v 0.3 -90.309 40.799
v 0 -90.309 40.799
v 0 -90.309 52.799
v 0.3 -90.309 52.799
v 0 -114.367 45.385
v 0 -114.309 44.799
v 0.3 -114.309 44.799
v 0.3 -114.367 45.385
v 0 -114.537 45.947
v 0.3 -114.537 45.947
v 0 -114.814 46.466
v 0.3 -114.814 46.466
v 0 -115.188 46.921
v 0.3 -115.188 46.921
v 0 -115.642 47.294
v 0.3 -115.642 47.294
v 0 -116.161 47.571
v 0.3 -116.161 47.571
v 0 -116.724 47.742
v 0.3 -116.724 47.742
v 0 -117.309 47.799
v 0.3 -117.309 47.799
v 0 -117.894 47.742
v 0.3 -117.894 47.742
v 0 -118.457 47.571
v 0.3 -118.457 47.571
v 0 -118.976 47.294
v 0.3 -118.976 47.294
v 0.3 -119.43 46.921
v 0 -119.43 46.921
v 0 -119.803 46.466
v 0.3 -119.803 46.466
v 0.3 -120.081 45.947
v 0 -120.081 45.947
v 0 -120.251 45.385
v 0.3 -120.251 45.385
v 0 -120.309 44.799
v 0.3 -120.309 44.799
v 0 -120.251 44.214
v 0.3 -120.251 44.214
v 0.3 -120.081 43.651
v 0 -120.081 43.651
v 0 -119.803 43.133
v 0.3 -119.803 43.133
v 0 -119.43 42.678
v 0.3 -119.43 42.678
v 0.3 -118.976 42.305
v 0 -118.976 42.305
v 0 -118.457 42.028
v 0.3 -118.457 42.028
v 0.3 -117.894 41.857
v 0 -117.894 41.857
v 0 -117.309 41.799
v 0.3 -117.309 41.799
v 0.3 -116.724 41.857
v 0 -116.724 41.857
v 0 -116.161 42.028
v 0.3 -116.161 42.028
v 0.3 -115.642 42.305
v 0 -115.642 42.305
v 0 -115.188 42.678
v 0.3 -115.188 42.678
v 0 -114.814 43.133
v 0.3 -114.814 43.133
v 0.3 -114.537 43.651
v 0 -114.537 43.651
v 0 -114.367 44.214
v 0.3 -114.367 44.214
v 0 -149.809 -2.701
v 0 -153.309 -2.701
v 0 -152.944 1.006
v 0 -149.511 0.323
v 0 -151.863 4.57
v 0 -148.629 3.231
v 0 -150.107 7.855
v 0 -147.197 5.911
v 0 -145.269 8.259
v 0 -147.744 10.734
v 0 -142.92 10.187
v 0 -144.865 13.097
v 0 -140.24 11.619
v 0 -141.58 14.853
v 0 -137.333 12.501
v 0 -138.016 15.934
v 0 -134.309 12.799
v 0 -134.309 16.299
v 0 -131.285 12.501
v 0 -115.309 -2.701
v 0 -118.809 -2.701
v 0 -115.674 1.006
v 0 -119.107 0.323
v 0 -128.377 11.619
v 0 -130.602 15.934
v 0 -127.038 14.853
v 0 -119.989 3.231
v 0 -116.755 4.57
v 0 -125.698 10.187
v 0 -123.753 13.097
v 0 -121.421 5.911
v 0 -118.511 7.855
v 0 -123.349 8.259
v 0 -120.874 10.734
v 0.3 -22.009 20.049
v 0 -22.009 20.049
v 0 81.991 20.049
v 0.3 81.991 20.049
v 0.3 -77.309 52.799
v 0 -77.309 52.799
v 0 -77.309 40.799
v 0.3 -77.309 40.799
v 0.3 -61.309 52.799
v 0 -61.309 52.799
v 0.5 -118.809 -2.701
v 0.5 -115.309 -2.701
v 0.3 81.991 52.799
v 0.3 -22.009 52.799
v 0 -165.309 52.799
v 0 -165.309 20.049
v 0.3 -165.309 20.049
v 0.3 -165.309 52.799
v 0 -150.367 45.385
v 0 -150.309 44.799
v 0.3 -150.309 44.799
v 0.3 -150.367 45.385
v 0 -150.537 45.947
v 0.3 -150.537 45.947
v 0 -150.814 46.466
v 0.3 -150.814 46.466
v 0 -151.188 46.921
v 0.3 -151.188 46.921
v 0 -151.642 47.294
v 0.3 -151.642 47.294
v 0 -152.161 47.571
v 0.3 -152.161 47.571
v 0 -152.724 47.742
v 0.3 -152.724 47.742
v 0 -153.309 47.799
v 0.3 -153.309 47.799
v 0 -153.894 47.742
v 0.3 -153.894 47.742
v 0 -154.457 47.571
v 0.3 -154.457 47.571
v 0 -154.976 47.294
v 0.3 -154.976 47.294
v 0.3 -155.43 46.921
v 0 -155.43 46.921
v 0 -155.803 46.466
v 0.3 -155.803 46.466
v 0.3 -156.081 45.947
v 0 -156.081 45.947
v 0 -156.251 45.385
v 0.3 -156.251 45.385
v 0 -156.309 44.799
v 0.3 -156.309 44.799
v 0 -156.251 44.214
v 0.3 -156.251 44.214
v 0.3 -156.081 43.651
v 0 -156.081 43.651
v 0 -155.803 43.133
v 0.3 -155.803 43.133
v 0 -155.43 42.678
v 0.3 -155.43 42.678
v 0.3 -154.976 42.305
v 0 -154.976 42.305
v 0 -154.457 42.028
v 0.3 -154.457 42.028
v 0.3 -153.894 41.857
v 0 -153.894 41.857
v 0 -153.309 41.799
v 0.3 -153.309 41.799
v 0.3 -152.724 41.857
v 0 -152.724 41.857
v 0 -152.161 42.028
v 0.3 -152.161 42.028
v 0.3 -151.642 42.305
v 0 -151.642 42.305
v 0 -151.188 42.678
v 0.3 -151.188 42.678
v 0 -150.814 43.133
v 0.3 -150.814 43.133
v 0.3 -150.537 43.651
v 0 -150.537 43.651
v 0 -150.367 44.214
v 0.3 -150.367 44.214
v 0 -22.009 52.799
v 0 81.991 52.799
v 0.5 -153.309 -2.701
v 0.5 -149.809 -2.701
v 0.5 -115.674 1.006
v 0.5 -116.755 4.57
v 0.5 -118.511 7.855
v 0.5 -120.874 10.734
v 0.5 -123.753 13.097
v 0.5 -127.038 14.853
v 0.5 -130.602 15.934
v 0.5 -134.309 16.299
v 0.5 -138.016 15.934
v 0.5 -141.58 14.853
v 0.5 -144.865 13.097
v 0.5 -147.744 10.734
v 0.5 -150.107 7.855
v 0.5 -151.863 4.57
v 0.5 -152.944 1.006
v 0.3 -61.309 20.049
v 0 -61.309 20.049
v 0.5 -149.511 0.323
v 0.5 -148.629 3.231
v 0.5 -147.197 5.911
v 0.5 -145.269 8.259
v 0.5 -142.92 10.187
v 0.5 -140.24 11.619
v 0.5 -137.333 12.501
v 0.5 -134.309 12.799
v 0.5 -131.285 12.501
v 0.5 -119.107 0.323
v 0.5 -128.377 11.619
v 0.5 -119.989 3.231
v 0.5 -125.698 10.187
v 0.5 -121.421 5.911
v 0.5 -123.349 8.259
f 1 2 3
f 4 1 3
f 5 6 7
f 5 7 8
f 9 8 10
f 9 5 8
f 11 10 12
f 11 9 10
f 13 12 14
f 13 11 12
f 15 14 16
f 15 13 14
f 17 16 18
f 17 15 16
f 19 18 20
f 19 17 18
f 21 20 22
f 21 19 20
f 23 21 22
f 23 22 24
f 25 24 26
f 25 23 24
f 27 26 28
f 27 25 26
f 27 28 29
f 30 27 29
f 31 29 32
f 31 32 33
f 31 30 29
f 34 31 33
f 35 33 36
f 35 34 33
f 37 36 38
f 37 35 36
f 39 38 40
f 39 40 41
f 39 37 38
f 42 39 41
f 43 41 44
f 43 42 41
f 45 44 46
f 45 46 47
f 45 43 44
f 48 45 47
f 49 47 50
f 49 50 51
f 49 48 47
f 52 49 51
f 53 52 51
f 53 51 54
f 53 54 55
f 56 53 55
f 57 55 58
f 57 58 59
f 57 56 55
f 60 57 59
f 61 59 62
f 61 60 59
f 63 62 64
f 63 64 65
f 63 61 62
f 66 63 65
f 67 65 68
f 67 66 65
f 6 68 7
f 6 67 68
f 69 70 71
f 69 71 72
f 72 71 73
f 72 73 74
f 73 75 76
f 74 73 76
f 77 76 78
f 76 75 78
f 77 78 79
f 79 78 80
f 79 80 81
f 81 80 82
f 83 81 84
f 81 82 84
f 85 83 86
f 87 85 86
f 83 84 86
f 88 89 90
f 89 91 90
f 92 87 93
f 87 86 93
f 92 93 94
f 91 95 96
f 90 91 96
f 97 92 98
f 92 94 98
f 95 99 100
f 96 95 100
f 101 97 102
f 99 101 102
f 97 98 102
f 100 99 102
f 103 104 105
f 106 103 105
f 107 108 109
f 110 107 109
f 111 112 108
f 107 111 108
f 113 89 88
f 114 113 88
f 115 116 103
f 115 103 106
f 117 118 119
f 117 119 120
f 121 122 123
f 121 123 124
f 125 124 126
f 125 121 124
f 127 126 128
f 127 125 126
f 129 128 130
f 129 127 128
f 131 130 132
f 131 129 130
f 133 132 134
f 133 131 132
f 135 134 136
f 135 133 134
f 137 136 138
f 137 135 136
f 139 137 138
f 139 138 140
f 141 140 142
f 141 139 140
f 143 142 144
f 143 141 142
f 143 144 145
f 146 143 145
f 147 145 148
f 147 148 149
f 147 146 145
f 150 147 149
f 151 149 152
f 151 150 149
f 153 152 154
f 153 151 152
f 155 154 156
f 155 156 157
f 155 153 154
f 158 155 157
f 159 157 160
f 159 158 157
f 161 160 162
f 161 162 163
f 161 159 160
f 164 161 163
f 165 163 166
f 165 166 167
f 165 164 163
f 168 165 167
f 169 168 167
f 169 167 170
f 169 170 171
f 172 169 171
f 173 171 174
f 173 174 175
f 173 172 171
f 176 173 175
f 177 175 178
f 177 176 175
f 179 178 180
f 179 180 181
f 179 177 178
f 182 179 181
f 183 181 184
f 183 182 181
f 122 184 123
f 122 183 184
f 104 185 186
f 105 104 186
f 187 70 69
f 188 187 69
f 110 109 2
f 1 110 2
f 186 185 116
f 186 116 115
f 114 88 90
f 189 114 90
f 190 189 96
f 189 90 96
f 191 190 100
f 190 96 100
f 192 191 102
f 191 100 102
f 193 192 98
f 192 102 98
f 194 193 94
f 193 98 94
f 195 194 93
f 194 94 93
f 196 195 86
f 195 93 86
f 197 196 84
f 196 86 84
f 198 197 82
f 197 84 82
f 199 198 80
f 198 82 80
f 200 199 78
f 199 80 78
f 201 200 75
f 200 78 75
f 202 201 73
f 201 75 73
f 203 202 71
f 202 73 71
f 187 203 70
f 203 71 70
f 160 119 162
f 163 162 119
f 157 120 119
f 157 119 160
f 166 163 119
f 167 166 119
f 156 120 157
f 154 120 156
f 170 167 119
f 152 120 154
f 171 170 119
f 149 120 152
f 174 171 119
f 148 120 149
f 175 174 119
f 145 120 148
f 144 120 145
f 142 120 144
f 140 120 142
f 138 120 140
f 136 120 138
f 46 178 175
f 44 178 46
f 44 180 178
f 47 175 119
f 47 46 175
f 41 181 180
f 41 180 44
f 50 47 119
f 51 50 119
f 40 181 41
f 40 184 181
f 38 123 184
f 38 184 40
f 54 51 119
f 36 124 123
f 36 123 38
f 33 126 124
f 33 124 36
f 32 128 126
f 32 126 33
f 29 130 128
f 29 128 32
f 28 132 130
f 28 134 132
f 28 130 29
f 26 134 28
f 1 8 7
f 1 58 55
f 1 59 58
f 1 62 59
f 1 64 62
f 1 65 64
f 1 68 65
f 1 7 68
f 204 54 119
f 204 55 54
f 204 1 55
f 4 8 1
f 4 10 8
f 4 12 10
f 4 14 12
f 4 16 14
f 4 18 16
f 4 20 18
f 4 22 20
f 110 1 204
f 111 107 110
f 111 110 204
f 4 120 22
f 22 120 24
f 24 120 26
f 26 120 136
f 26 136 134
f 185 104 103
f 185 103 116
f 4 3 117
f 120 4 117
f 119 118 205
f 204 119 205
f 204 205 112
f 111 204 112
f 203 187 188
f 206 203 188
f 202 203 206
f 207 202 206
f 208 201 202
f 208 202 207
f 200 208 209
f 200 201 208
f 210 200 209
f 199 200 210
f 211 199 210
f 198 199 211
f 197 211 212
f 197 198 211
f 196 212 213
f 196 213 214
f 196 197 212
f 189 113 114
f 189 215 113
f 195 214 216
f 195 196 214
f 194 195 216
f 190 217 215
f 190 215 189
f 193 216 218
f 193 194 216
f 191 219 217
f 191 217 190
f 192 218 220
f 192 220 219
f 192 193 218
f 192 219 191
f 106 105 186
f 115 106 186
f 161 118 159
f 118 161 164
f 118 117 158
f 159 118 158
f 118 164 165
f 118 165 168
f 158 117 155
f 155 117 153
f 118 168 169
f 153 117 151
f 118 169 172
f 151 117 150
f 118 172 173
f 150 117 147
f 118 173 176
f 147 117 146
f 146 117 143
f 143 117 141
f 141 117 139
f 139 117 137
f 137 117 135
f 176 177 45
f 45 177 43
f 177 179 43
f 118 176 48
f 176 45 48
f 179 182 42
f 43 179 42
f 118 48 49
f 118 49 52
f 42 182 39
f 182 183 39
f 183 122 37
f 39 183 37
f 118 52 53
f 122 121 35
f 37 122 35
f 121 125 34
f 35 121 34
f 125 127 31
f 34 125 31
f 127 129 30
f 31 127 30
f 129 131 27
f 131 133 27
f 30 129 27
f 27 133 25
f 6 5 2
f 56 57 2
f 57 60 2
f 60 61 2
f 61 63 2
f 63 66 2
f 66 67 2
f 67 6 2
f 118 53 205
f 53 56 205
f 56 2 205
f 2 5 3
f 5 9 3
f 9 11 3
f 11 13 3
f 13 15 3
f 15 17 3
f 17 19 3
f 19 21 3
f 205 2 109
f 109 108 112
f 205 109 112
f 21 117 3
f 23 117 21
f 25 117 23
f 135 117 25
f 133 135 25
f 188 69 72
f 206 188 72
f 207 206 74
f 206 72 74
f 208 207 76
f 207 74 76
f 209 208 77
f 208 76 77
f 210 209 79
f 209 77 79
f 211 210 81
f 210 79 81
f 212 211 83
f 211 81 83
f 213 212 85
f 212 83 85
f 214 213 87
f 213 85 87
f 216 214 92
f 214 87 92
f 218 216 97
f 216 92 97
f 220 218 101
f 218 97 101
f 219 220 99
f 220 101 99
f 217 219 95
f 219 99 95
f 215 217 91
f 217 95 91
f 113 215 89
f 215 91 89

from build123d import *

# Parameters (mm, degrees)
F0_W     = 62
F0_H     = 32.75
F0_R     = 3
F1_DEPTH = 0.3
F0_W_2   = 104
F2_DEPTH = 0.5


# Not quite as in the source:
# - a feature names something its author has since deleted; it is built from what else it names


with BuildPart() as f1:
    # F0 (on Right) → F1 (new body)
    with BuildSketch(Plane.YZ):
        Polygon((-103.3088661638, 20.0492352203), (-61.3088661638, 20.0492352203), (-61.3088661638, 52.7992352203), (-77.3088661638, 52.7992352203), (-77.3088661638, 40.7992352203), (-90.3088661638, 40.7992352203), (-90.3088661638, 52.7992352203), (-103.3088661638, 52.7992352203), align=None)
        with Locations((-134.3088661638, 36.4242352203)):
            Rectangle(F0_W, F0_H)
        with Locations((-153.3088661638, 44.7992352203)):
            Circle(F0_R, mode=Mode.SUBTRACT)
        with Locations((-117.3088661638, 44.7992352203)):
            Circle(F0_R, mode=Mode.SUBTRACT)
    extrude(amount=F1_DEPTH)


with BuildPart() as f1b:
    # F0 (on Right) → F1, piece 2 (new body)
    with BuildSketch(Plane.YZ):
        with Locations((29.9911338362, 36.4242352203)):
            Rectangle(F0_W_2, F0_H)
    extrude(amount=F1_DEPTH)


with BuildPart() as f2:
    # F0 (on Right) → F2 (new body)
    with BuildSketch(Plane.YZ):
        with BuildLine():
            Line((-118.8088661638, -2.7007647797), (-115.3088661638, -2.7007647797))
            ThreePointArc((-115.3088661638, -2.7007647797), (-134.3088661638, 16.2992352203), (-153.3088661638, -2.7007647797))
            Line((-153.3088661638, -2.7007647797), (-149.8088661638, -2.7007647797))
            ThreePointArc((-149.8088661638, -2.7007647797), (-134.3088661638, 12.7992352203), (-118.8088661638, -2.7007647797))
        make_face()
    extrude(amount=F2_DEPTH)


solid = Compound([f1.part, f1b.part, f2.part])
